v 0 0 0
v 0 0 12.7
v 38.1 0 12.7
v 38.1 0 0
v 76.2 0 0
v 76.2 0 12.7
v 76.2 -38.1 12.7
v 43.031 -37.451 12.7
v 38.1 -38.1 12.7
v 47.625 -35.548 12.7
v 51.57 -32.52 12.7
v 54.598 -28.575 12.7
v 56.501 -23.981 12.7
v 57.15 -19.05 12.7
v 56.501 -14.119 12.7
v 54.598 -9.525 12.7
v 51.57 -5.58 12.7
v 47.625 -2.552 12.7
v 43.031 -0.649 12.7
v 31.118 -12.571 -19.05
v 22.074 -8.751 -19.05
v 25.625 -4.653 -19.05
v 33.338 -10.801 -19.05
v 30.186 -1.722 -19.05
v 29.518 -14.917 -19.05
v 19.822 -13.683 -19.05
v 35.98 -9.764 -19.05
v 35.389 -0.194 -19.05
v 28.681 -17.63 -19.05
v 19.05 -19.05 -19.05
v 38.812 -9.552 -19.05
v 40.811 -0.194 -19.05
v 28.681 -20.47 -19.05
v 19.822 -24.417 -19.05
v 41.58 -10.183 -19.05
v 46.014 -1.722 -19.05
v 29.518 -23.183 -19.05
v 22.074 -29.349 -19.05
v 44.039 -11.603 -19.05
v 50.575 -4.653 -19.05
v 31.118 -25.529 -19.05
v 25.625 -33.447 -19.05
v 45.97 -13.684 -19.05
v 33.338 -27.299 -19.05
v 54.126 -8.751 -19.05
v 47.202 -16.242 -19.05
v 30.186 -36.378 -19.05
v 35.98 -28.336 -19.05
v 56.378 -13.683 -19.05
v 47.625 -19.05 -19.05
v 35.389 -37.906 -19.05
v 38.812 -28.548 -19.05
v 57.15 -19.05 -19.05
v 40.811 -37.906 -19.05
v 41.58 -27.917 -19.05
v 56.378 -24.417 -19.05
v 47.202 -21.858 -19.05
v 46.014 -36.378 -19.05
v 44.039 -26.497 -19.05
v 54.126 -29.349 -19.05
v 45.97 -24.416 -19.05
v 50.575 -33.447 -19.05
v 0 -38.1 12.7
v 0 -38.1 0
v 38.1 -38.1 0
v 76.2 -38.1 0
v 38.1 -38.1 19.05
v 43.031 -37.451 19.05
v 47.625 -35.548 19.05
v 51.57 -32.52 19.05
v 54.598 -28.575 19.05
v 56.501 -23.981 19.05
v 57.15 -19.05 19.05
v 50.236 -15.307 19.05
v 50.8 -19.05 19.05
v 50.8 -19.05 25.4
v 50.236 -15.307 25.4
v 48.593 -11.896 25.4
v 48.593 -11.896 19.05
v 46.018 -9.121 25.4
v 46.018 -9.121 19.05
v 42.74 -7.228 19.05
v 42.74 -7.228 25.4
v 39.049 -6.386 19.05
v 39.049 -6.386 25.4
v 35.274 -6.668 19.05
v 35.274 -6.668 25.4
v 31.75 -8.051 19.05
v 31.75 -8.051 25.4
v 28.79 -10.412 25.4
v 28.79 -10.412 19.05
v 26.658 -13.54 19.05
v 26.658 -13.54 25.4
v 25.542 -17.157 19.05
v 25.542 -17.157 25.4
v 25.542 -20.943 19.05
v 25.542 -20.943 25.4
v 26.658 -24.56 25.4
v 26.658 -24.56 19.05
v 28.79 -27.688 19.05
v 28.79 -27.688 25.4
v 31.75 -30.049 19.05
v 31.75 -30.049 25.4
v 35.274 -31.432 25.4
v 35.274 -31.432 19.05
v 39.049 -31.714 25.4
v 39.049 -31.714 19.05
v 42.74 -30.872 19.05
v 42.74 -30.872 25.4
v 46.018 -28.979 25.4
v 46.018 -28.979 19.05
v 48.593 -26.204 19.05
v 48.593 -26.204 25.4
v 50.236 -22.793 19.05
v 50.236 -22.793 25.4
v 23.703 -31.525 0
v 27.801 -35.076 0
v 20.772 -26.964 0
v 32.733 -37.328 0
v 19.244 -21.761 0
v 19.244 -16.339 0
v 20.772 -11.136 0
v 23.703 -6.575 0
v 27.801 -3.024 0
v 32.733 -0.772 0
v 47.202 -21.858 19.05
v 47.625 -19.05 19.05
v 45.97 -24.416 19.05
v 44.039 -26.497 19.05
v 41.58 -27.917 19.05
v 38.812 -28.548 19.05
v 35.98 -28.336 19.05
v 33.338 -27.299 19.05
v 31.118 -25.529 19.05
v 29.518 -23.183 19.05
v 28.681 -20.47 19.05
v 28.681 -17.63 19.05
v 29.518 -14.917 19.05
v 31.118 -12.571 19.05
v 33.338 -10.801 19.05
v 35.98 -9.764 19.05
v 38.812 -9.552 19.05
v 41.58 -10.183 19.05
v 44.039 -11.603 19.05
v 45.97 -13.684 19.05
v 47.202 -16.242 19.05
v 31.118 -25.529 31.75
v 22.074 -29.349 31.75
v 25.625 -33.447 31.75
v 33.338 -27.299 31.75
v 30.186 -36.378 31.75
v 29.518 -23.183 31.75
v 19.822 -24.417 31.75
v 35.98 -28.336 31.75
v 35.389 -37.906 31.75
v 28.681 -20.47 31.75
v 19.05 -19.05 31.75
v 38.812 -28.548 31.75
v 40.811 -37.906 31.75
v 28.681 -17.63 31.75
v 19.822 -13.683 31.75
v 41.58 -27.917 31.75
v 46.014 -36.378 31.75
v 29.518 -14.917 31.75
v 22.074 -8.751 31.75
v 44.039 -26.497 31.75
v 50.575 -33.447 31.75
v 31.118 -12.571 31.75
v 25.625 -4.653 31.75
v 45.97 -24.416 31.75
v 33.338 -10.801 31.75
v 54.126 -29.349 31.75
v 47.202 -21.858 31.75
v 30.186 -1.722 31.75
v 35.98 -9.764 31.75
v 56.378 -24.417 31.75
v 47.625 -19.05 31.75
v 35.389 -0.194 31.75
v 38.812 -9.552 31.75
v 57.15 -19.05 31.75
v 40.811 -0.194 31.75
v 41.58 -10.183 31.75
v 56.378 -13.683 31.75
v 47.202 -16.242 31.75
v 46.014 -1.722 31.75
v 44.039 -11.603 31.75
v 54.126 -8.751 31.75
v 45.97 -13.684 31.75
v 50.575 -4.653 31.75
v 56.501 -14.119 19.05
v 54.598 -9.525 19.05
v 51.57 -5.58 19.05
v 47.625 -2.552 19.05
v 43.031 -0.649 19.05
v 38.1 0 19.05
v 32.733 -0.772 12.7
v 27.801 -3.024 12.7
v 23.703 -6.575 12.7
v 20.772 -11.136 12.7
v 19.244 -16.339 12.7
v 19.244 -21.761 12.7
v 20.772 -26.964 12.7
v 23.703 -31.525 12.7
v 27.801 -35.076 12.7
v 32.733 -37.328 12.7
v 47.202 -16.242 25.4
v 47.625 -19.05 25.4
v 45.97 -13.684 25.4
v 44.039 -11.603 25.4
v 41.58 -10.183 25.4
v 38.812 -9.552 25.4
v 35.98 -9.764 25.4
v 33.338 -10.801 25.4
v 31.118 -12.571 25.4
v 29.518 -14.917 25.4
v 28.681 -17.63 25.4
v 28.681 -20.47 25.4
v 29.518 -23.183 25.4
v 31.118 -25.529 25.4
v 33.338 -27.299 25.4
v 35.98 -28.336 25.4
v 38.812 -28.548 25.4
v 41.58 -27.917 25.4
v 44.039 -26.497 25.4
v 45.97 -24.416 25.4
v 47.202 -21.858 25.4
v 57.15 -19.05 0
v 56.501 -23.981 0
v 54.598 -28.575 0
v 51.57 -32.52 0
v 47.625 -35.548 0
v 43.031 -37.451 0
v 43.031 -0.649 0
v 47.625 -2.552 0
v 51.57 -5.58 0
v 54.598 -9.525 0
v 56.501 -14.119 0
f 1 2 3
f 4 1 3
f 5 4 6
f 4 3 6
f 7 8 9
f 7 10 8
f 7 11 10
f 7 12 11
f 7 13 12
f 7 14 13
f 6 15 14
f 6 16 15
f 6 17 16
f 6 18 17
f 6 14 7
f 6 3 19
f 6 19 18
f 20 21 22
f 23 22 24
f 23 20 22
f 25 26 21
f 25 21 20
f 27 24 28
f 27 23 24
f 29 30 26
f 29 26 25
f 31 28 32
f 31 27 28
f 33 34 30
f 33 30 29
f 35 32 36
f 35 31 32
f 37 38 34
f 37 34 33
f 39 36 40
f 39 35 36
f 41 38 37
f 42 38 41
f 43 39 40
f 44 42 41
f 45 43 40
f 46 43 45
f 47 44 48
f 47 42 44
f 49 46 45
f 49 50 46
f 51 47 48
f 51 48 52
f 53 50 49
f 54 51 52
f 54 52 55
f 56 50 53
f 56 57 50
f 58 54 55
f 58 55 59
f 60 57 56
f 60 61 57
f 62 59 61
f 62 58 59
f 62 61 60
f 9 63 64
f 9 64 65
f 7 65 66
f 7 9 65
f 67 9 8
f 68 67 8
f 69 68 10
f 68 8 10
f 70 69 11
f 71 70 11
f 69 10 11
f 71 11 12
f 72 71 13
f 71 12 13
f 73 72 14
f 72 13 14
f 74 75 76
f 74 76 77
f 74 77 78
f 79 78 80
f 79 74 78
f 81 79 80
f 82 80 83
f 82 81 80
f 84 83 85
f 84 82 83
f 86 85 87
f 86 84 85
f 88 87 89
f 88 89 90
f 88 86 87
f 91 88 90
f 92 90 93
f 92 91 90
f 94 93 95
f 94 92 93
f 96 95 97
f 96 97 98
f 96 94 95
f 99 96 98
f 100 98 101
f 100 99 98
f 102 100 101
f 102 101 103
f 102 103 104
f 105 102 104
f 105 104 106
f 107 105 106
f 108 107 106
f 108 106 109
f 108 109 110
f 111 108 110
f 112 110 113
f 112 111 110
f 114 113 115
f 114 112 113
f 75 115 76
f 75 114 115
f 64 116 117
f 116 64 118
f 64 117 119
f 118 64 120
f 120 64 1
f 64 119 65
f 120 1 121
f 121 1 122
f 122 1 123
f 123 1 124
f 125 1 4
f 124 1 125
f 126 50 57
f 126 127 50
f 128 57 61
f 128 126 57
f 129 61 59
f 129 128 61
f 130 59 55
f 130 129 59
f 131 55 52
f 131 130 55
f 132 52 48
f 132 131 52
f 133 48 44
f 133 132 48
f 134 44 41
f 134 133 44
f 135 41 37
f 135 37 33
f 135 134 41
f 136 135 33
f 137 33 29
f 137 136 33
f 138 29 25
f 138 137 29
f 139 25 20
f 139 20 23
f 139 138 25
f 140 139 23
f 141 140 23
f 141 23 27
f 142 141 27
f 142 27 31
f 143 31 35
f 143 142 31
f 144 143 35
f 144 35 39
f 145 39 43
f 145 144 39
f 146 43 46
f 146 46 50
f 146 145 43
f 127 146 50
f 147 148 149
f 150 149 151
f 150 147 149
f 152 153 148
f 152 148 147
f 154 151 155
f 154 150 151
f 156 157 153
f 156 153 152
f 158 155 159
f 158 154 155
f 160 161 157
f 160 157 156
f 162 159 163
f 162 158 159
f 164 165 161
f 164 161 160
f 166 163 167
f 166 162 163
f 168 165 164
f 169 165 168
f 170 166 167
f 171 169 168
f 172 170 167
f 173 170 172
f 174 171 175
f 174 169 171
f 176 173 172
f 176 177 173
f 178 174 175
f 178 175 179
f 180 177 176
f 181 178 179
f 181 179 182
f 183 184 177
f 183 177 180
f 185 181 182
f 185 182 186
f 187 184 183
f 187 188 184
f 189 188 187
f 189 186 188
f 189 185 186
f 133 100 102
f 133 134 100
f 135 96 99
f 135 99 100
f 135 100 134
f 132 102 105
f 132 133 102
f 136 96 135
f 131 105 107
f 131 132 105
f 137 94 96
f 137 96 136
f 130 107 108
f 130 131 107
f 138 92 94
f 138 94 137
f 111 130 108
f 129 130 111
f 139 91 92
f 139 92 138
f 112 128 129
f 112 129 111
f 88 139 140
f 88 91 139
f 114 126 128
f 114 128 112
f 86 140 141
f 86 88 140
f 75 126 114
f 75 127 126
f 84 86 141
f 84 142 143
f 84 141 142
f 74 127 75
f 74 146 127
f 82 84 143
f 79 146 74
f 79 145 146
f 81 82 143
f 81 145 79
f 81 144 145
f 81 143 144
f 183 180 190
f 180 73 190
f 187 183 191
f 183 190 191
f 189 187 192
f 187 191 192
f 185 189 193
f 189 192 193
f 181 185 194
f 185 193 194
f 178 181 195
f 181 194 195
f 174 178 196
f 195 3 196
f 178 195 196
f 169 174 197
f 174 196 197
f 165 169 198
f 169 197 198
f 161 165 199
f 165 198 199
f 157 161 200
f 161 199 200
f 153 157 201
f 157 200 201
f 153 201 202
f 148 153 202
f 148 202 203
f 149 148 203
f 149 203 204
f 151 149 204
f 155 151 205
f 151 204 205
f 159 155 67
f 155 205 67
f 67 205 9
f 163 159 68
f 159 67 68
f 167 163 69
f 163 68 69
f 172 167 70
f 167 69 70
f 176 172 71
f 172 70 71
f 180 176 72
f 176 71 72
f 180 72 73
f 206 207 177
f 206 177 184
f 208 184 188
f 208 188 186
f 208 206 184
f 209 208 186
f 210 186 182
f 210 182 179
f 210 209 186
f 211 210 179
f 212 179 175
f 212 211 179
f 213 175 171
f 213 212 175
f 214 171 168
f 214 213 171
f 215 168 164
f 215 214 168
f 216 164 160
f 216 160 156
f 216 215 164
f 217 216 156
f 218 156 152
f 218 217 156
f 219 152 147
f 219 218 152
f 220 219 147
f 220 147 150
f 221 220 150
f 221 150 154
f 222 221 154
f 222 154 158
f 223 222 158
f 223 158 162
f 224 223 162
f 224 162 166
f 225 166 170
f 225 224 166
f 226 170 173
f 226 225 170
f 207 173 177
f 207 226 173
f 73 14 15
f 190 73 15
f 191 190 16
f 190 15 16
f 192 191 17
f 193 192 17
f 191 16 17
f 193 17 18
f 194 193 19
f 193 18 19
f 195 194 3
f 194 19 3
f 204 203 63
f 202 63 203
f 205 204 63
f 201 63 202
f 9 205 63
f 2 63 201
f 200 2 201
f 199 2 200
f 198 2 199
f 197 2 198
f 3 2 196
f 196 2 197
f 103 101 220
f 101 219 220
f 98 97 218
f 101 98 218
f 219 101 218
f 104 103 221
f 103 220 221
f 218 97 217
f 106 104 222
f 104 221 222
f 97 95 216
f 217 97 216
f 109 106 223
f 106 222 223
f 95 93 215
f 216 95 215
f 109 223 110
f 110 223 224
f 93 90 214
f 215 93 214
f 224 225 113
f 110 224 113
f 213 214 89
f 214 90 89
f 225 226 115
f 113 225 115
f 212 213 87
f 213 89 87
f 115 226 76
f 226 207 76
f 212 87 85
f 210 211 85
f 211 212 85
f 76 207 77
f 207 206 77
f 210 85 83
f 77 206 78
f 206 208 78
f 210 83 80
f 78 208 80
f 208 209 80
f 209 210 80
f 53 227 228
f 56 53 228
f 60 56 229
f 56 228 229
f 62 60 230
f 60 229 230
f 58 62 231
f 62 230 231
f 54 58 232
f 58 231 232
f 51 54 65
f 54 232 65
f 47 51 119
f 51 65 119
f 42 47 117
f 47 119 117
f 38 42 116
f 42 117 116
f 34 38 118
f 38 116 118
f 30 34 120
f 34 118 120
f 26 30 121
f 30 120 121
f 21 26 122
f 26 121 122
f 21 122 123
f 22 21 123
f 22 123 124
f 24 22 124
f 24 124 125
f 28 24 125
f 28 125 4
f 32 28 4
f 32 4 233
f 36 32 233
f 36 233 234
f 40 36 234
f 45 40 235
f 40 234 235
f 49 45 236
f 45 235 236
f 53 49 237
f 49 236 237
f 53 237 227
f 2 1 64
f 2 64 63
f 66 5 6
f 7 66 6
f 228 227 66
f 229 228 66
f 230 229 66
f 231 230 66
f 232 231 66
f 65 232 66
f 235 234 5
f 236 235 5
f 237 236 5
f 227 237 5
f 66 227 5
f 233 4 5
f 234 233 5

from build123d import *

# Parameters (mm, degrees)
F0_W      = 76.2
F0_H      = 12.7
F1_DEPTH  = 38.1
F2_R      = 9.525
F3_DEPTH  = 6.35
F3_FACE_R = 9.525
F4_DEPTH  = 12.701
F5_R      = 19.05
F5_R_2    = 9.525
F6_DEPTH  = 19.05
F7_R      = 19.05
F7_R_2    = 12.7
F8_DEPTH  = 6.35
F9_R      = 19.05
F9_R_2    = 9.525
F10_DEPTH = 6.35


with BuildPart() as f1:
    # F0 (on Front) → F1 (new body)
    with BuildSketch(Plane.XZ):
        with Locations((38.1, 6.35)):
            Rectangle(F0_W, F0_H)
    extrude(amount=F1_DEPTH)

    # F2 (on face) → F3 (join)
    with BuildSketch(Plane.XY.offset(12.7)):
        with BuildLine():
            ThreePointArc((38.1, -38.1), (51.570384, -32.520384), (57.15, -19.05))
            ThreePointArc((57.15, -19.05), (51.570384, -5.579616), (38.1, 0))
            ThreePointArc((38.1, 0), (19.05, -19.05), (38.1, -38.1))
        make_face()
        with Locations((38.1, -19.05)):
            Circle(F2_R, mode=Mode.SUBTRACT)
    extrude(amount=F3_DEPTH)

    # F3_face (on face) → F4 (cut, through all)
    with BuildSketch(Plane(origin=(38.1, -19.05, 12.7), x_dir=(1, 0, 0), z_dir=(0, 0, 1))):
        Circle(F3_FACE_R)
    extrude(amount=-F4_DEPTH, mode=Mode.SUBTRACT)

    # F5 (on face) → F6 (join)
    with BuildSketch(Plane(origin=(0, 0, 0), x_dir=(1, 0, 0), z_dir=(0, 0, -1))):
        with Locations((38.1, 19.05)):
            Circle(F5_R)
        with Locations((38.1, 19.05)):
            Circle(F5_R_2, mode=Mode.SUBTRACT)
    extrude(amount=F6_DEPTH)

    # F7 (on face) → F8 (join)
    with BuildSketch(Plane.XY.offset(19.05)):
        with Locations((38.1, -19.05)):
            Circle(F7_R)
        with Locations((38.1, -19.05)):
            Circle(F7_R_2, mode=Mode.SUBTRACT)
    extrude(amount=F8_DEPTH)

    # F9 (on face) → F10 (join)
    with BuildSketch(Plane.XY.offset(25.4)):
        with Locations((38.1, -19.05)):
            Circle(F9_R)
        with Locations((38.1, -19.05)):
            Circle(F9_R_2, mode=Mode.SUBTRACT)
    extrude(amount=F10_DEPTH)


solid = f1.part
